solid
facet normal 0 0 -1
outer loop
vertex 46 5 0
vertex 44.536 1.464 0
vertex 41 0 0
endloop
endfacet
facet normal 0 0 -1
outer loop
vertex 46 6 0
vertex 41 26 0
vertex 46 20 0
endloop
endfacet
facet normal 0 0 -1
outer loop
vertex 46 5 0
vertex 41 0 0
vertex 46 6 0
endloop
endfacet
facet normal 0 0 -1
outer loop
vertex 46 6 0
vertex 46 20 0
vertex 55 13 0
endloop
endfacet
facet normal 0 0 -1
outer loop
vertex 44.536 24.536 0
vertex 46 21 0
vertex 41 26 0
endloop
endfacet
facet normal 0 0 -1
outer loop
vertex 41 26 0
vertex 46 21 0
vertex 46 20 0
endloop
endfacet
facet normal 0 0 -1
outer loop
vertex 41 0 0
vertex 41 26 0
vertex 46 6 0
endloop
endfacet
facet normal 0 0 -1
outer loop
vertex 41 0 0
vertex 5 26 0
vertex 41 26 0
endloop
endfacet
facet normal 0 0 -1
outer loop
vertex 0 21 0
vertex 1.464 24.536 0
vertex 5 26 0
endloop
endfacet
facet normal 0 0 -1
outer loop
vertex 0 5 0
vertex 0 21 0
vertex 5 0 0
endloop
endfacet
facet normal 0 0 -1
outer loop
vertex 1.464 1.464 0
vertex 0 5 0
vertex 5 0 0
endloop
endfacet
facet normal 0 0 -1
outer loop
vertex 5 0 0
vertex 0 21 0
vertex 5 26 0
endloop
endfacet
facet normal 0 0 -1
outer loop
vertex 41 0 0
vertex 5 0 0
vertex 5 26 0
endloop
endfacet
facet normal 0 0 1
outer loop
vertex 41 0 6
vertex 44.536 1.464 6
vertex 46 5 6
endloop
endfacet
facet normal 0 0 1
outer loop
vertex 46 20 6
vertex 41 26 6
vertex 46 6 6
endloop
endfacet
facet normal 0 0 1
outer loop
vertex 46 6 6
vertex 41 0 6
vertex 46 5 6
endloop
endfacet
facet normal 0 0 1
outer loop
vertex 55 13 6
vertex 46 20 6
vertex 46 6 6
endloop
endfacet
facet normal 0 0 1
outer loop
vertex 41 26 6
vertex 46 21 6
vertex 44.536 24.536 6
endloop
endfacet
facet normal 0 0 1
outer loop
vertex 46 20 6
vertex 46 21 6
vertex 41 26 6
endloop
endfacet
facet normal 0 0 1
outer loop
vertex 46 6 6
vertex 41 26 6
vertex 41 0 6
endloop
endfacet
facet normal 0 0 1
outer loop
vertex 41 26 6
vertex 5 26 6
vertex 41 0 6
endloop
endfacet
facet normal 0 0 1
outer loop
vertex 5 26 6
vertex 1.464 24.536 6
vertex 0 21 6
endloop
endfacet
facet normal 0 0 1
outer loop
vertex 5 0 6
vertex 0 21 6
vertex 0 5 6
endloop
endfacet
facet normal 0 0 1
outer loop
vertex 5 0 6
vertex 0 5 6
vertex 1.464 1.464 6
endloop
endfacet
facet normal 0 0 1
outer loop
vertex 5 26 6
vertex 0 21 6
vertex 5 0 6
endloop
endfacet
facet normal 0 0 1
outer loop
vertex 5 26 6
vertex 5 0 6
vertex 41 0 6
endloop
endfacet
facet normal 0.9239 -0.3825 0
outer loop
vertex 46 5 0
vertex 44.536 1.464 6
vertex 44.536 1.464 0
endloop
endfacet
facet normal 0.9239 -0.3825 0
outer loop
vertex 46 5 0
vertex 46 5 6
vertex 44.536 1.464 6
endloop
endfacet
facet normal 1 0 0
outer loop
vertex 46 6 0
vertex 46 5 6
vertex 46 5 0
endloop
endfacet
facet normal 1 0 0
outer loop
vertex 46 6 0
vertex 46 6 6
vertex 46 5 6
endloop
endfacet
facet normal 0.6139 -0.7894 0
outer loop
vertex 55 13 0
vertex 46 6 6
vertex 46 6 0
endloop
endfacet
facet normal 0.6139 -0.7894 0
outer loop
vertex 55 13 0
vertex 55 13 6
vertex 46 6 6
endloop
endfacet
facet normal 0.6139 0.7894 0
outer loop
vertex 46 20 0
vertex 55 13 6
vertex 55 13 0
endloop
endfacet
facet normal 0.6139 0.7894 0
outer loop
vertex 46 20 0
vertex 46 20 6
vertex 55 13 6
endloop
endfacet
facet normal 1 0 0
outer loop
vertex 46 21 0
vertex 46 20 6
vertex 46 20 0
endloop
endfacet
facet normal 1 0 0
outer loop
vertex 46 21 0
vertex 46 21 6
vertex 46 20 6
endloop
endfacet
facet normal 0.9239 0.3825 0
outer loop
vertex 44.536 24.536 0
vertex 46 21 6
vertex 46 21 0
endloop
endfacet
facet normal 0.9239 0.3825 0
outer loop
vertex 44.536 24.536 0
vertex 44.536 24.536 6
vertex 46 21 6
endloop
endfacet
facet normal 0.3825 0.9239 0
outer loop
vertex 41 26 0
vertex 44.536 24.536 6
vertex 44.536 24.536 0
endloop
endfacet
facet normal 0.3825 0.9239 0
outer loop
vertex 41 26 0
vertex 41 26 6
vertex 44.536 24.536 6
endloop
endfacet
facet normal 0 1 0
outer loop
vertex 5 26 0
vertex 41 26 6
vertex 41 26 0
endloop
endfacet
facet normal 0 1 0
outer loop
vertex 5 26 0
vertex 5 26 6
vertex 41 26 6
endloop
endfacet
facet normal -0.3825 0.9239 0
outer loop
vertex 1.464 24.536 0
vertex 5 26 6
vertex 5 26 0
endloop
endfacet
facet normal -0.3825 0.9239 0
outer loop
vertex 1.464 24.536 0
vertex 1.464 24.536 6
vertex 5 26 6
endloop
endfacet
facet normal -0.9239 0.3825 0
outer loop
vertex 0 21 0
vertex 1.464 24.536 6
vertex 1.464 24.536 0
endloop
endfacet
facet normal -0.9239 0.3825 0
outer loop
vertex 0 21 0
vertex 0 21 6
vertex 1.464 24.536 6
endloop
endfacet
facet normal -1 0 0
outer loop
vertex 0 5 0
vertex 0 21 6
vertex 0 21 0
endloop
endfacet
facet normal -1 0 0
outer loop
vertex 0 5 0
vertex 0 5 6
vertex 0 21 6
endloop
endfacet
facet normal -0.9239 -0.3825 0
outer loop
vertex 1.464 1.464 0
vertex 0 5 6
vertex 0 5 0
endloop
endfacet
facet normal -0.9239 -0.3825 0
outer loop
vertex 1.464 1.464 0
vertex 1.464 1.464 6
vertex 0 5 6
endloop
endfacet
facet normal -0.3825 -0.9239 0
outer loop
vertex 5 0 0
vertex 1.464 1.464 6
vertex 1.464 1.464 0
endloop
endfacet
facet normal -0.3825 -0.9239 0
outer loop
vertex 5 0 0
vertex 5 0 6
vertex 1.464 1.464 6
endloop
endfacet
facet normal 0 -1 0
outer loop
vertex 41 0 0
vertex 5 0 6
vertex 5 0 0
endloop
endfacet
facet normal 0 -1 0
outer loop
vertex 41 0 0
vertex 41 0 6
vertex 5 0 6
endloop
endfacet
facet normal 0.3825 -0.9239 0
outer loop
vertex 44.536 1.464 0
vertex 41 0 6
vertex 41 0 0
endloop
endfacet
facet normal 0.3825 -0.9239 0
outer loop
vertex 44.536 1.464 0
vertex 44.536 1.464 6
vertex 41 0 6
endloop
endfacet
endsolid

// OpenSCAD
$fn = 32;

// ----------------------------------------------------------------------
// Ratchet pawl: 46 x 26 mm body, beak 9 mm с правого торца
// ----------------------------------------------------------------------

// --- parameters (mm) ---
profile_height = 6;       // extrusion height
profile_points = 15;      // points of the closed outline

profile = [[0, 5], [1.464, 1.464], [5, 0], [41, 0], [44.536, 1.464], [46, 5], [46, 6], [55, 13], [46, 20], [46, 21], [44.536, 24.536], [41, 26], [5, 26], [1.464, 24.536], [0, 21]];  // single closed polygon, 15 points, counter clockwise

// --- the one profile operation ---
linear_extrude(height = profile_height) polygon(points = profile);
